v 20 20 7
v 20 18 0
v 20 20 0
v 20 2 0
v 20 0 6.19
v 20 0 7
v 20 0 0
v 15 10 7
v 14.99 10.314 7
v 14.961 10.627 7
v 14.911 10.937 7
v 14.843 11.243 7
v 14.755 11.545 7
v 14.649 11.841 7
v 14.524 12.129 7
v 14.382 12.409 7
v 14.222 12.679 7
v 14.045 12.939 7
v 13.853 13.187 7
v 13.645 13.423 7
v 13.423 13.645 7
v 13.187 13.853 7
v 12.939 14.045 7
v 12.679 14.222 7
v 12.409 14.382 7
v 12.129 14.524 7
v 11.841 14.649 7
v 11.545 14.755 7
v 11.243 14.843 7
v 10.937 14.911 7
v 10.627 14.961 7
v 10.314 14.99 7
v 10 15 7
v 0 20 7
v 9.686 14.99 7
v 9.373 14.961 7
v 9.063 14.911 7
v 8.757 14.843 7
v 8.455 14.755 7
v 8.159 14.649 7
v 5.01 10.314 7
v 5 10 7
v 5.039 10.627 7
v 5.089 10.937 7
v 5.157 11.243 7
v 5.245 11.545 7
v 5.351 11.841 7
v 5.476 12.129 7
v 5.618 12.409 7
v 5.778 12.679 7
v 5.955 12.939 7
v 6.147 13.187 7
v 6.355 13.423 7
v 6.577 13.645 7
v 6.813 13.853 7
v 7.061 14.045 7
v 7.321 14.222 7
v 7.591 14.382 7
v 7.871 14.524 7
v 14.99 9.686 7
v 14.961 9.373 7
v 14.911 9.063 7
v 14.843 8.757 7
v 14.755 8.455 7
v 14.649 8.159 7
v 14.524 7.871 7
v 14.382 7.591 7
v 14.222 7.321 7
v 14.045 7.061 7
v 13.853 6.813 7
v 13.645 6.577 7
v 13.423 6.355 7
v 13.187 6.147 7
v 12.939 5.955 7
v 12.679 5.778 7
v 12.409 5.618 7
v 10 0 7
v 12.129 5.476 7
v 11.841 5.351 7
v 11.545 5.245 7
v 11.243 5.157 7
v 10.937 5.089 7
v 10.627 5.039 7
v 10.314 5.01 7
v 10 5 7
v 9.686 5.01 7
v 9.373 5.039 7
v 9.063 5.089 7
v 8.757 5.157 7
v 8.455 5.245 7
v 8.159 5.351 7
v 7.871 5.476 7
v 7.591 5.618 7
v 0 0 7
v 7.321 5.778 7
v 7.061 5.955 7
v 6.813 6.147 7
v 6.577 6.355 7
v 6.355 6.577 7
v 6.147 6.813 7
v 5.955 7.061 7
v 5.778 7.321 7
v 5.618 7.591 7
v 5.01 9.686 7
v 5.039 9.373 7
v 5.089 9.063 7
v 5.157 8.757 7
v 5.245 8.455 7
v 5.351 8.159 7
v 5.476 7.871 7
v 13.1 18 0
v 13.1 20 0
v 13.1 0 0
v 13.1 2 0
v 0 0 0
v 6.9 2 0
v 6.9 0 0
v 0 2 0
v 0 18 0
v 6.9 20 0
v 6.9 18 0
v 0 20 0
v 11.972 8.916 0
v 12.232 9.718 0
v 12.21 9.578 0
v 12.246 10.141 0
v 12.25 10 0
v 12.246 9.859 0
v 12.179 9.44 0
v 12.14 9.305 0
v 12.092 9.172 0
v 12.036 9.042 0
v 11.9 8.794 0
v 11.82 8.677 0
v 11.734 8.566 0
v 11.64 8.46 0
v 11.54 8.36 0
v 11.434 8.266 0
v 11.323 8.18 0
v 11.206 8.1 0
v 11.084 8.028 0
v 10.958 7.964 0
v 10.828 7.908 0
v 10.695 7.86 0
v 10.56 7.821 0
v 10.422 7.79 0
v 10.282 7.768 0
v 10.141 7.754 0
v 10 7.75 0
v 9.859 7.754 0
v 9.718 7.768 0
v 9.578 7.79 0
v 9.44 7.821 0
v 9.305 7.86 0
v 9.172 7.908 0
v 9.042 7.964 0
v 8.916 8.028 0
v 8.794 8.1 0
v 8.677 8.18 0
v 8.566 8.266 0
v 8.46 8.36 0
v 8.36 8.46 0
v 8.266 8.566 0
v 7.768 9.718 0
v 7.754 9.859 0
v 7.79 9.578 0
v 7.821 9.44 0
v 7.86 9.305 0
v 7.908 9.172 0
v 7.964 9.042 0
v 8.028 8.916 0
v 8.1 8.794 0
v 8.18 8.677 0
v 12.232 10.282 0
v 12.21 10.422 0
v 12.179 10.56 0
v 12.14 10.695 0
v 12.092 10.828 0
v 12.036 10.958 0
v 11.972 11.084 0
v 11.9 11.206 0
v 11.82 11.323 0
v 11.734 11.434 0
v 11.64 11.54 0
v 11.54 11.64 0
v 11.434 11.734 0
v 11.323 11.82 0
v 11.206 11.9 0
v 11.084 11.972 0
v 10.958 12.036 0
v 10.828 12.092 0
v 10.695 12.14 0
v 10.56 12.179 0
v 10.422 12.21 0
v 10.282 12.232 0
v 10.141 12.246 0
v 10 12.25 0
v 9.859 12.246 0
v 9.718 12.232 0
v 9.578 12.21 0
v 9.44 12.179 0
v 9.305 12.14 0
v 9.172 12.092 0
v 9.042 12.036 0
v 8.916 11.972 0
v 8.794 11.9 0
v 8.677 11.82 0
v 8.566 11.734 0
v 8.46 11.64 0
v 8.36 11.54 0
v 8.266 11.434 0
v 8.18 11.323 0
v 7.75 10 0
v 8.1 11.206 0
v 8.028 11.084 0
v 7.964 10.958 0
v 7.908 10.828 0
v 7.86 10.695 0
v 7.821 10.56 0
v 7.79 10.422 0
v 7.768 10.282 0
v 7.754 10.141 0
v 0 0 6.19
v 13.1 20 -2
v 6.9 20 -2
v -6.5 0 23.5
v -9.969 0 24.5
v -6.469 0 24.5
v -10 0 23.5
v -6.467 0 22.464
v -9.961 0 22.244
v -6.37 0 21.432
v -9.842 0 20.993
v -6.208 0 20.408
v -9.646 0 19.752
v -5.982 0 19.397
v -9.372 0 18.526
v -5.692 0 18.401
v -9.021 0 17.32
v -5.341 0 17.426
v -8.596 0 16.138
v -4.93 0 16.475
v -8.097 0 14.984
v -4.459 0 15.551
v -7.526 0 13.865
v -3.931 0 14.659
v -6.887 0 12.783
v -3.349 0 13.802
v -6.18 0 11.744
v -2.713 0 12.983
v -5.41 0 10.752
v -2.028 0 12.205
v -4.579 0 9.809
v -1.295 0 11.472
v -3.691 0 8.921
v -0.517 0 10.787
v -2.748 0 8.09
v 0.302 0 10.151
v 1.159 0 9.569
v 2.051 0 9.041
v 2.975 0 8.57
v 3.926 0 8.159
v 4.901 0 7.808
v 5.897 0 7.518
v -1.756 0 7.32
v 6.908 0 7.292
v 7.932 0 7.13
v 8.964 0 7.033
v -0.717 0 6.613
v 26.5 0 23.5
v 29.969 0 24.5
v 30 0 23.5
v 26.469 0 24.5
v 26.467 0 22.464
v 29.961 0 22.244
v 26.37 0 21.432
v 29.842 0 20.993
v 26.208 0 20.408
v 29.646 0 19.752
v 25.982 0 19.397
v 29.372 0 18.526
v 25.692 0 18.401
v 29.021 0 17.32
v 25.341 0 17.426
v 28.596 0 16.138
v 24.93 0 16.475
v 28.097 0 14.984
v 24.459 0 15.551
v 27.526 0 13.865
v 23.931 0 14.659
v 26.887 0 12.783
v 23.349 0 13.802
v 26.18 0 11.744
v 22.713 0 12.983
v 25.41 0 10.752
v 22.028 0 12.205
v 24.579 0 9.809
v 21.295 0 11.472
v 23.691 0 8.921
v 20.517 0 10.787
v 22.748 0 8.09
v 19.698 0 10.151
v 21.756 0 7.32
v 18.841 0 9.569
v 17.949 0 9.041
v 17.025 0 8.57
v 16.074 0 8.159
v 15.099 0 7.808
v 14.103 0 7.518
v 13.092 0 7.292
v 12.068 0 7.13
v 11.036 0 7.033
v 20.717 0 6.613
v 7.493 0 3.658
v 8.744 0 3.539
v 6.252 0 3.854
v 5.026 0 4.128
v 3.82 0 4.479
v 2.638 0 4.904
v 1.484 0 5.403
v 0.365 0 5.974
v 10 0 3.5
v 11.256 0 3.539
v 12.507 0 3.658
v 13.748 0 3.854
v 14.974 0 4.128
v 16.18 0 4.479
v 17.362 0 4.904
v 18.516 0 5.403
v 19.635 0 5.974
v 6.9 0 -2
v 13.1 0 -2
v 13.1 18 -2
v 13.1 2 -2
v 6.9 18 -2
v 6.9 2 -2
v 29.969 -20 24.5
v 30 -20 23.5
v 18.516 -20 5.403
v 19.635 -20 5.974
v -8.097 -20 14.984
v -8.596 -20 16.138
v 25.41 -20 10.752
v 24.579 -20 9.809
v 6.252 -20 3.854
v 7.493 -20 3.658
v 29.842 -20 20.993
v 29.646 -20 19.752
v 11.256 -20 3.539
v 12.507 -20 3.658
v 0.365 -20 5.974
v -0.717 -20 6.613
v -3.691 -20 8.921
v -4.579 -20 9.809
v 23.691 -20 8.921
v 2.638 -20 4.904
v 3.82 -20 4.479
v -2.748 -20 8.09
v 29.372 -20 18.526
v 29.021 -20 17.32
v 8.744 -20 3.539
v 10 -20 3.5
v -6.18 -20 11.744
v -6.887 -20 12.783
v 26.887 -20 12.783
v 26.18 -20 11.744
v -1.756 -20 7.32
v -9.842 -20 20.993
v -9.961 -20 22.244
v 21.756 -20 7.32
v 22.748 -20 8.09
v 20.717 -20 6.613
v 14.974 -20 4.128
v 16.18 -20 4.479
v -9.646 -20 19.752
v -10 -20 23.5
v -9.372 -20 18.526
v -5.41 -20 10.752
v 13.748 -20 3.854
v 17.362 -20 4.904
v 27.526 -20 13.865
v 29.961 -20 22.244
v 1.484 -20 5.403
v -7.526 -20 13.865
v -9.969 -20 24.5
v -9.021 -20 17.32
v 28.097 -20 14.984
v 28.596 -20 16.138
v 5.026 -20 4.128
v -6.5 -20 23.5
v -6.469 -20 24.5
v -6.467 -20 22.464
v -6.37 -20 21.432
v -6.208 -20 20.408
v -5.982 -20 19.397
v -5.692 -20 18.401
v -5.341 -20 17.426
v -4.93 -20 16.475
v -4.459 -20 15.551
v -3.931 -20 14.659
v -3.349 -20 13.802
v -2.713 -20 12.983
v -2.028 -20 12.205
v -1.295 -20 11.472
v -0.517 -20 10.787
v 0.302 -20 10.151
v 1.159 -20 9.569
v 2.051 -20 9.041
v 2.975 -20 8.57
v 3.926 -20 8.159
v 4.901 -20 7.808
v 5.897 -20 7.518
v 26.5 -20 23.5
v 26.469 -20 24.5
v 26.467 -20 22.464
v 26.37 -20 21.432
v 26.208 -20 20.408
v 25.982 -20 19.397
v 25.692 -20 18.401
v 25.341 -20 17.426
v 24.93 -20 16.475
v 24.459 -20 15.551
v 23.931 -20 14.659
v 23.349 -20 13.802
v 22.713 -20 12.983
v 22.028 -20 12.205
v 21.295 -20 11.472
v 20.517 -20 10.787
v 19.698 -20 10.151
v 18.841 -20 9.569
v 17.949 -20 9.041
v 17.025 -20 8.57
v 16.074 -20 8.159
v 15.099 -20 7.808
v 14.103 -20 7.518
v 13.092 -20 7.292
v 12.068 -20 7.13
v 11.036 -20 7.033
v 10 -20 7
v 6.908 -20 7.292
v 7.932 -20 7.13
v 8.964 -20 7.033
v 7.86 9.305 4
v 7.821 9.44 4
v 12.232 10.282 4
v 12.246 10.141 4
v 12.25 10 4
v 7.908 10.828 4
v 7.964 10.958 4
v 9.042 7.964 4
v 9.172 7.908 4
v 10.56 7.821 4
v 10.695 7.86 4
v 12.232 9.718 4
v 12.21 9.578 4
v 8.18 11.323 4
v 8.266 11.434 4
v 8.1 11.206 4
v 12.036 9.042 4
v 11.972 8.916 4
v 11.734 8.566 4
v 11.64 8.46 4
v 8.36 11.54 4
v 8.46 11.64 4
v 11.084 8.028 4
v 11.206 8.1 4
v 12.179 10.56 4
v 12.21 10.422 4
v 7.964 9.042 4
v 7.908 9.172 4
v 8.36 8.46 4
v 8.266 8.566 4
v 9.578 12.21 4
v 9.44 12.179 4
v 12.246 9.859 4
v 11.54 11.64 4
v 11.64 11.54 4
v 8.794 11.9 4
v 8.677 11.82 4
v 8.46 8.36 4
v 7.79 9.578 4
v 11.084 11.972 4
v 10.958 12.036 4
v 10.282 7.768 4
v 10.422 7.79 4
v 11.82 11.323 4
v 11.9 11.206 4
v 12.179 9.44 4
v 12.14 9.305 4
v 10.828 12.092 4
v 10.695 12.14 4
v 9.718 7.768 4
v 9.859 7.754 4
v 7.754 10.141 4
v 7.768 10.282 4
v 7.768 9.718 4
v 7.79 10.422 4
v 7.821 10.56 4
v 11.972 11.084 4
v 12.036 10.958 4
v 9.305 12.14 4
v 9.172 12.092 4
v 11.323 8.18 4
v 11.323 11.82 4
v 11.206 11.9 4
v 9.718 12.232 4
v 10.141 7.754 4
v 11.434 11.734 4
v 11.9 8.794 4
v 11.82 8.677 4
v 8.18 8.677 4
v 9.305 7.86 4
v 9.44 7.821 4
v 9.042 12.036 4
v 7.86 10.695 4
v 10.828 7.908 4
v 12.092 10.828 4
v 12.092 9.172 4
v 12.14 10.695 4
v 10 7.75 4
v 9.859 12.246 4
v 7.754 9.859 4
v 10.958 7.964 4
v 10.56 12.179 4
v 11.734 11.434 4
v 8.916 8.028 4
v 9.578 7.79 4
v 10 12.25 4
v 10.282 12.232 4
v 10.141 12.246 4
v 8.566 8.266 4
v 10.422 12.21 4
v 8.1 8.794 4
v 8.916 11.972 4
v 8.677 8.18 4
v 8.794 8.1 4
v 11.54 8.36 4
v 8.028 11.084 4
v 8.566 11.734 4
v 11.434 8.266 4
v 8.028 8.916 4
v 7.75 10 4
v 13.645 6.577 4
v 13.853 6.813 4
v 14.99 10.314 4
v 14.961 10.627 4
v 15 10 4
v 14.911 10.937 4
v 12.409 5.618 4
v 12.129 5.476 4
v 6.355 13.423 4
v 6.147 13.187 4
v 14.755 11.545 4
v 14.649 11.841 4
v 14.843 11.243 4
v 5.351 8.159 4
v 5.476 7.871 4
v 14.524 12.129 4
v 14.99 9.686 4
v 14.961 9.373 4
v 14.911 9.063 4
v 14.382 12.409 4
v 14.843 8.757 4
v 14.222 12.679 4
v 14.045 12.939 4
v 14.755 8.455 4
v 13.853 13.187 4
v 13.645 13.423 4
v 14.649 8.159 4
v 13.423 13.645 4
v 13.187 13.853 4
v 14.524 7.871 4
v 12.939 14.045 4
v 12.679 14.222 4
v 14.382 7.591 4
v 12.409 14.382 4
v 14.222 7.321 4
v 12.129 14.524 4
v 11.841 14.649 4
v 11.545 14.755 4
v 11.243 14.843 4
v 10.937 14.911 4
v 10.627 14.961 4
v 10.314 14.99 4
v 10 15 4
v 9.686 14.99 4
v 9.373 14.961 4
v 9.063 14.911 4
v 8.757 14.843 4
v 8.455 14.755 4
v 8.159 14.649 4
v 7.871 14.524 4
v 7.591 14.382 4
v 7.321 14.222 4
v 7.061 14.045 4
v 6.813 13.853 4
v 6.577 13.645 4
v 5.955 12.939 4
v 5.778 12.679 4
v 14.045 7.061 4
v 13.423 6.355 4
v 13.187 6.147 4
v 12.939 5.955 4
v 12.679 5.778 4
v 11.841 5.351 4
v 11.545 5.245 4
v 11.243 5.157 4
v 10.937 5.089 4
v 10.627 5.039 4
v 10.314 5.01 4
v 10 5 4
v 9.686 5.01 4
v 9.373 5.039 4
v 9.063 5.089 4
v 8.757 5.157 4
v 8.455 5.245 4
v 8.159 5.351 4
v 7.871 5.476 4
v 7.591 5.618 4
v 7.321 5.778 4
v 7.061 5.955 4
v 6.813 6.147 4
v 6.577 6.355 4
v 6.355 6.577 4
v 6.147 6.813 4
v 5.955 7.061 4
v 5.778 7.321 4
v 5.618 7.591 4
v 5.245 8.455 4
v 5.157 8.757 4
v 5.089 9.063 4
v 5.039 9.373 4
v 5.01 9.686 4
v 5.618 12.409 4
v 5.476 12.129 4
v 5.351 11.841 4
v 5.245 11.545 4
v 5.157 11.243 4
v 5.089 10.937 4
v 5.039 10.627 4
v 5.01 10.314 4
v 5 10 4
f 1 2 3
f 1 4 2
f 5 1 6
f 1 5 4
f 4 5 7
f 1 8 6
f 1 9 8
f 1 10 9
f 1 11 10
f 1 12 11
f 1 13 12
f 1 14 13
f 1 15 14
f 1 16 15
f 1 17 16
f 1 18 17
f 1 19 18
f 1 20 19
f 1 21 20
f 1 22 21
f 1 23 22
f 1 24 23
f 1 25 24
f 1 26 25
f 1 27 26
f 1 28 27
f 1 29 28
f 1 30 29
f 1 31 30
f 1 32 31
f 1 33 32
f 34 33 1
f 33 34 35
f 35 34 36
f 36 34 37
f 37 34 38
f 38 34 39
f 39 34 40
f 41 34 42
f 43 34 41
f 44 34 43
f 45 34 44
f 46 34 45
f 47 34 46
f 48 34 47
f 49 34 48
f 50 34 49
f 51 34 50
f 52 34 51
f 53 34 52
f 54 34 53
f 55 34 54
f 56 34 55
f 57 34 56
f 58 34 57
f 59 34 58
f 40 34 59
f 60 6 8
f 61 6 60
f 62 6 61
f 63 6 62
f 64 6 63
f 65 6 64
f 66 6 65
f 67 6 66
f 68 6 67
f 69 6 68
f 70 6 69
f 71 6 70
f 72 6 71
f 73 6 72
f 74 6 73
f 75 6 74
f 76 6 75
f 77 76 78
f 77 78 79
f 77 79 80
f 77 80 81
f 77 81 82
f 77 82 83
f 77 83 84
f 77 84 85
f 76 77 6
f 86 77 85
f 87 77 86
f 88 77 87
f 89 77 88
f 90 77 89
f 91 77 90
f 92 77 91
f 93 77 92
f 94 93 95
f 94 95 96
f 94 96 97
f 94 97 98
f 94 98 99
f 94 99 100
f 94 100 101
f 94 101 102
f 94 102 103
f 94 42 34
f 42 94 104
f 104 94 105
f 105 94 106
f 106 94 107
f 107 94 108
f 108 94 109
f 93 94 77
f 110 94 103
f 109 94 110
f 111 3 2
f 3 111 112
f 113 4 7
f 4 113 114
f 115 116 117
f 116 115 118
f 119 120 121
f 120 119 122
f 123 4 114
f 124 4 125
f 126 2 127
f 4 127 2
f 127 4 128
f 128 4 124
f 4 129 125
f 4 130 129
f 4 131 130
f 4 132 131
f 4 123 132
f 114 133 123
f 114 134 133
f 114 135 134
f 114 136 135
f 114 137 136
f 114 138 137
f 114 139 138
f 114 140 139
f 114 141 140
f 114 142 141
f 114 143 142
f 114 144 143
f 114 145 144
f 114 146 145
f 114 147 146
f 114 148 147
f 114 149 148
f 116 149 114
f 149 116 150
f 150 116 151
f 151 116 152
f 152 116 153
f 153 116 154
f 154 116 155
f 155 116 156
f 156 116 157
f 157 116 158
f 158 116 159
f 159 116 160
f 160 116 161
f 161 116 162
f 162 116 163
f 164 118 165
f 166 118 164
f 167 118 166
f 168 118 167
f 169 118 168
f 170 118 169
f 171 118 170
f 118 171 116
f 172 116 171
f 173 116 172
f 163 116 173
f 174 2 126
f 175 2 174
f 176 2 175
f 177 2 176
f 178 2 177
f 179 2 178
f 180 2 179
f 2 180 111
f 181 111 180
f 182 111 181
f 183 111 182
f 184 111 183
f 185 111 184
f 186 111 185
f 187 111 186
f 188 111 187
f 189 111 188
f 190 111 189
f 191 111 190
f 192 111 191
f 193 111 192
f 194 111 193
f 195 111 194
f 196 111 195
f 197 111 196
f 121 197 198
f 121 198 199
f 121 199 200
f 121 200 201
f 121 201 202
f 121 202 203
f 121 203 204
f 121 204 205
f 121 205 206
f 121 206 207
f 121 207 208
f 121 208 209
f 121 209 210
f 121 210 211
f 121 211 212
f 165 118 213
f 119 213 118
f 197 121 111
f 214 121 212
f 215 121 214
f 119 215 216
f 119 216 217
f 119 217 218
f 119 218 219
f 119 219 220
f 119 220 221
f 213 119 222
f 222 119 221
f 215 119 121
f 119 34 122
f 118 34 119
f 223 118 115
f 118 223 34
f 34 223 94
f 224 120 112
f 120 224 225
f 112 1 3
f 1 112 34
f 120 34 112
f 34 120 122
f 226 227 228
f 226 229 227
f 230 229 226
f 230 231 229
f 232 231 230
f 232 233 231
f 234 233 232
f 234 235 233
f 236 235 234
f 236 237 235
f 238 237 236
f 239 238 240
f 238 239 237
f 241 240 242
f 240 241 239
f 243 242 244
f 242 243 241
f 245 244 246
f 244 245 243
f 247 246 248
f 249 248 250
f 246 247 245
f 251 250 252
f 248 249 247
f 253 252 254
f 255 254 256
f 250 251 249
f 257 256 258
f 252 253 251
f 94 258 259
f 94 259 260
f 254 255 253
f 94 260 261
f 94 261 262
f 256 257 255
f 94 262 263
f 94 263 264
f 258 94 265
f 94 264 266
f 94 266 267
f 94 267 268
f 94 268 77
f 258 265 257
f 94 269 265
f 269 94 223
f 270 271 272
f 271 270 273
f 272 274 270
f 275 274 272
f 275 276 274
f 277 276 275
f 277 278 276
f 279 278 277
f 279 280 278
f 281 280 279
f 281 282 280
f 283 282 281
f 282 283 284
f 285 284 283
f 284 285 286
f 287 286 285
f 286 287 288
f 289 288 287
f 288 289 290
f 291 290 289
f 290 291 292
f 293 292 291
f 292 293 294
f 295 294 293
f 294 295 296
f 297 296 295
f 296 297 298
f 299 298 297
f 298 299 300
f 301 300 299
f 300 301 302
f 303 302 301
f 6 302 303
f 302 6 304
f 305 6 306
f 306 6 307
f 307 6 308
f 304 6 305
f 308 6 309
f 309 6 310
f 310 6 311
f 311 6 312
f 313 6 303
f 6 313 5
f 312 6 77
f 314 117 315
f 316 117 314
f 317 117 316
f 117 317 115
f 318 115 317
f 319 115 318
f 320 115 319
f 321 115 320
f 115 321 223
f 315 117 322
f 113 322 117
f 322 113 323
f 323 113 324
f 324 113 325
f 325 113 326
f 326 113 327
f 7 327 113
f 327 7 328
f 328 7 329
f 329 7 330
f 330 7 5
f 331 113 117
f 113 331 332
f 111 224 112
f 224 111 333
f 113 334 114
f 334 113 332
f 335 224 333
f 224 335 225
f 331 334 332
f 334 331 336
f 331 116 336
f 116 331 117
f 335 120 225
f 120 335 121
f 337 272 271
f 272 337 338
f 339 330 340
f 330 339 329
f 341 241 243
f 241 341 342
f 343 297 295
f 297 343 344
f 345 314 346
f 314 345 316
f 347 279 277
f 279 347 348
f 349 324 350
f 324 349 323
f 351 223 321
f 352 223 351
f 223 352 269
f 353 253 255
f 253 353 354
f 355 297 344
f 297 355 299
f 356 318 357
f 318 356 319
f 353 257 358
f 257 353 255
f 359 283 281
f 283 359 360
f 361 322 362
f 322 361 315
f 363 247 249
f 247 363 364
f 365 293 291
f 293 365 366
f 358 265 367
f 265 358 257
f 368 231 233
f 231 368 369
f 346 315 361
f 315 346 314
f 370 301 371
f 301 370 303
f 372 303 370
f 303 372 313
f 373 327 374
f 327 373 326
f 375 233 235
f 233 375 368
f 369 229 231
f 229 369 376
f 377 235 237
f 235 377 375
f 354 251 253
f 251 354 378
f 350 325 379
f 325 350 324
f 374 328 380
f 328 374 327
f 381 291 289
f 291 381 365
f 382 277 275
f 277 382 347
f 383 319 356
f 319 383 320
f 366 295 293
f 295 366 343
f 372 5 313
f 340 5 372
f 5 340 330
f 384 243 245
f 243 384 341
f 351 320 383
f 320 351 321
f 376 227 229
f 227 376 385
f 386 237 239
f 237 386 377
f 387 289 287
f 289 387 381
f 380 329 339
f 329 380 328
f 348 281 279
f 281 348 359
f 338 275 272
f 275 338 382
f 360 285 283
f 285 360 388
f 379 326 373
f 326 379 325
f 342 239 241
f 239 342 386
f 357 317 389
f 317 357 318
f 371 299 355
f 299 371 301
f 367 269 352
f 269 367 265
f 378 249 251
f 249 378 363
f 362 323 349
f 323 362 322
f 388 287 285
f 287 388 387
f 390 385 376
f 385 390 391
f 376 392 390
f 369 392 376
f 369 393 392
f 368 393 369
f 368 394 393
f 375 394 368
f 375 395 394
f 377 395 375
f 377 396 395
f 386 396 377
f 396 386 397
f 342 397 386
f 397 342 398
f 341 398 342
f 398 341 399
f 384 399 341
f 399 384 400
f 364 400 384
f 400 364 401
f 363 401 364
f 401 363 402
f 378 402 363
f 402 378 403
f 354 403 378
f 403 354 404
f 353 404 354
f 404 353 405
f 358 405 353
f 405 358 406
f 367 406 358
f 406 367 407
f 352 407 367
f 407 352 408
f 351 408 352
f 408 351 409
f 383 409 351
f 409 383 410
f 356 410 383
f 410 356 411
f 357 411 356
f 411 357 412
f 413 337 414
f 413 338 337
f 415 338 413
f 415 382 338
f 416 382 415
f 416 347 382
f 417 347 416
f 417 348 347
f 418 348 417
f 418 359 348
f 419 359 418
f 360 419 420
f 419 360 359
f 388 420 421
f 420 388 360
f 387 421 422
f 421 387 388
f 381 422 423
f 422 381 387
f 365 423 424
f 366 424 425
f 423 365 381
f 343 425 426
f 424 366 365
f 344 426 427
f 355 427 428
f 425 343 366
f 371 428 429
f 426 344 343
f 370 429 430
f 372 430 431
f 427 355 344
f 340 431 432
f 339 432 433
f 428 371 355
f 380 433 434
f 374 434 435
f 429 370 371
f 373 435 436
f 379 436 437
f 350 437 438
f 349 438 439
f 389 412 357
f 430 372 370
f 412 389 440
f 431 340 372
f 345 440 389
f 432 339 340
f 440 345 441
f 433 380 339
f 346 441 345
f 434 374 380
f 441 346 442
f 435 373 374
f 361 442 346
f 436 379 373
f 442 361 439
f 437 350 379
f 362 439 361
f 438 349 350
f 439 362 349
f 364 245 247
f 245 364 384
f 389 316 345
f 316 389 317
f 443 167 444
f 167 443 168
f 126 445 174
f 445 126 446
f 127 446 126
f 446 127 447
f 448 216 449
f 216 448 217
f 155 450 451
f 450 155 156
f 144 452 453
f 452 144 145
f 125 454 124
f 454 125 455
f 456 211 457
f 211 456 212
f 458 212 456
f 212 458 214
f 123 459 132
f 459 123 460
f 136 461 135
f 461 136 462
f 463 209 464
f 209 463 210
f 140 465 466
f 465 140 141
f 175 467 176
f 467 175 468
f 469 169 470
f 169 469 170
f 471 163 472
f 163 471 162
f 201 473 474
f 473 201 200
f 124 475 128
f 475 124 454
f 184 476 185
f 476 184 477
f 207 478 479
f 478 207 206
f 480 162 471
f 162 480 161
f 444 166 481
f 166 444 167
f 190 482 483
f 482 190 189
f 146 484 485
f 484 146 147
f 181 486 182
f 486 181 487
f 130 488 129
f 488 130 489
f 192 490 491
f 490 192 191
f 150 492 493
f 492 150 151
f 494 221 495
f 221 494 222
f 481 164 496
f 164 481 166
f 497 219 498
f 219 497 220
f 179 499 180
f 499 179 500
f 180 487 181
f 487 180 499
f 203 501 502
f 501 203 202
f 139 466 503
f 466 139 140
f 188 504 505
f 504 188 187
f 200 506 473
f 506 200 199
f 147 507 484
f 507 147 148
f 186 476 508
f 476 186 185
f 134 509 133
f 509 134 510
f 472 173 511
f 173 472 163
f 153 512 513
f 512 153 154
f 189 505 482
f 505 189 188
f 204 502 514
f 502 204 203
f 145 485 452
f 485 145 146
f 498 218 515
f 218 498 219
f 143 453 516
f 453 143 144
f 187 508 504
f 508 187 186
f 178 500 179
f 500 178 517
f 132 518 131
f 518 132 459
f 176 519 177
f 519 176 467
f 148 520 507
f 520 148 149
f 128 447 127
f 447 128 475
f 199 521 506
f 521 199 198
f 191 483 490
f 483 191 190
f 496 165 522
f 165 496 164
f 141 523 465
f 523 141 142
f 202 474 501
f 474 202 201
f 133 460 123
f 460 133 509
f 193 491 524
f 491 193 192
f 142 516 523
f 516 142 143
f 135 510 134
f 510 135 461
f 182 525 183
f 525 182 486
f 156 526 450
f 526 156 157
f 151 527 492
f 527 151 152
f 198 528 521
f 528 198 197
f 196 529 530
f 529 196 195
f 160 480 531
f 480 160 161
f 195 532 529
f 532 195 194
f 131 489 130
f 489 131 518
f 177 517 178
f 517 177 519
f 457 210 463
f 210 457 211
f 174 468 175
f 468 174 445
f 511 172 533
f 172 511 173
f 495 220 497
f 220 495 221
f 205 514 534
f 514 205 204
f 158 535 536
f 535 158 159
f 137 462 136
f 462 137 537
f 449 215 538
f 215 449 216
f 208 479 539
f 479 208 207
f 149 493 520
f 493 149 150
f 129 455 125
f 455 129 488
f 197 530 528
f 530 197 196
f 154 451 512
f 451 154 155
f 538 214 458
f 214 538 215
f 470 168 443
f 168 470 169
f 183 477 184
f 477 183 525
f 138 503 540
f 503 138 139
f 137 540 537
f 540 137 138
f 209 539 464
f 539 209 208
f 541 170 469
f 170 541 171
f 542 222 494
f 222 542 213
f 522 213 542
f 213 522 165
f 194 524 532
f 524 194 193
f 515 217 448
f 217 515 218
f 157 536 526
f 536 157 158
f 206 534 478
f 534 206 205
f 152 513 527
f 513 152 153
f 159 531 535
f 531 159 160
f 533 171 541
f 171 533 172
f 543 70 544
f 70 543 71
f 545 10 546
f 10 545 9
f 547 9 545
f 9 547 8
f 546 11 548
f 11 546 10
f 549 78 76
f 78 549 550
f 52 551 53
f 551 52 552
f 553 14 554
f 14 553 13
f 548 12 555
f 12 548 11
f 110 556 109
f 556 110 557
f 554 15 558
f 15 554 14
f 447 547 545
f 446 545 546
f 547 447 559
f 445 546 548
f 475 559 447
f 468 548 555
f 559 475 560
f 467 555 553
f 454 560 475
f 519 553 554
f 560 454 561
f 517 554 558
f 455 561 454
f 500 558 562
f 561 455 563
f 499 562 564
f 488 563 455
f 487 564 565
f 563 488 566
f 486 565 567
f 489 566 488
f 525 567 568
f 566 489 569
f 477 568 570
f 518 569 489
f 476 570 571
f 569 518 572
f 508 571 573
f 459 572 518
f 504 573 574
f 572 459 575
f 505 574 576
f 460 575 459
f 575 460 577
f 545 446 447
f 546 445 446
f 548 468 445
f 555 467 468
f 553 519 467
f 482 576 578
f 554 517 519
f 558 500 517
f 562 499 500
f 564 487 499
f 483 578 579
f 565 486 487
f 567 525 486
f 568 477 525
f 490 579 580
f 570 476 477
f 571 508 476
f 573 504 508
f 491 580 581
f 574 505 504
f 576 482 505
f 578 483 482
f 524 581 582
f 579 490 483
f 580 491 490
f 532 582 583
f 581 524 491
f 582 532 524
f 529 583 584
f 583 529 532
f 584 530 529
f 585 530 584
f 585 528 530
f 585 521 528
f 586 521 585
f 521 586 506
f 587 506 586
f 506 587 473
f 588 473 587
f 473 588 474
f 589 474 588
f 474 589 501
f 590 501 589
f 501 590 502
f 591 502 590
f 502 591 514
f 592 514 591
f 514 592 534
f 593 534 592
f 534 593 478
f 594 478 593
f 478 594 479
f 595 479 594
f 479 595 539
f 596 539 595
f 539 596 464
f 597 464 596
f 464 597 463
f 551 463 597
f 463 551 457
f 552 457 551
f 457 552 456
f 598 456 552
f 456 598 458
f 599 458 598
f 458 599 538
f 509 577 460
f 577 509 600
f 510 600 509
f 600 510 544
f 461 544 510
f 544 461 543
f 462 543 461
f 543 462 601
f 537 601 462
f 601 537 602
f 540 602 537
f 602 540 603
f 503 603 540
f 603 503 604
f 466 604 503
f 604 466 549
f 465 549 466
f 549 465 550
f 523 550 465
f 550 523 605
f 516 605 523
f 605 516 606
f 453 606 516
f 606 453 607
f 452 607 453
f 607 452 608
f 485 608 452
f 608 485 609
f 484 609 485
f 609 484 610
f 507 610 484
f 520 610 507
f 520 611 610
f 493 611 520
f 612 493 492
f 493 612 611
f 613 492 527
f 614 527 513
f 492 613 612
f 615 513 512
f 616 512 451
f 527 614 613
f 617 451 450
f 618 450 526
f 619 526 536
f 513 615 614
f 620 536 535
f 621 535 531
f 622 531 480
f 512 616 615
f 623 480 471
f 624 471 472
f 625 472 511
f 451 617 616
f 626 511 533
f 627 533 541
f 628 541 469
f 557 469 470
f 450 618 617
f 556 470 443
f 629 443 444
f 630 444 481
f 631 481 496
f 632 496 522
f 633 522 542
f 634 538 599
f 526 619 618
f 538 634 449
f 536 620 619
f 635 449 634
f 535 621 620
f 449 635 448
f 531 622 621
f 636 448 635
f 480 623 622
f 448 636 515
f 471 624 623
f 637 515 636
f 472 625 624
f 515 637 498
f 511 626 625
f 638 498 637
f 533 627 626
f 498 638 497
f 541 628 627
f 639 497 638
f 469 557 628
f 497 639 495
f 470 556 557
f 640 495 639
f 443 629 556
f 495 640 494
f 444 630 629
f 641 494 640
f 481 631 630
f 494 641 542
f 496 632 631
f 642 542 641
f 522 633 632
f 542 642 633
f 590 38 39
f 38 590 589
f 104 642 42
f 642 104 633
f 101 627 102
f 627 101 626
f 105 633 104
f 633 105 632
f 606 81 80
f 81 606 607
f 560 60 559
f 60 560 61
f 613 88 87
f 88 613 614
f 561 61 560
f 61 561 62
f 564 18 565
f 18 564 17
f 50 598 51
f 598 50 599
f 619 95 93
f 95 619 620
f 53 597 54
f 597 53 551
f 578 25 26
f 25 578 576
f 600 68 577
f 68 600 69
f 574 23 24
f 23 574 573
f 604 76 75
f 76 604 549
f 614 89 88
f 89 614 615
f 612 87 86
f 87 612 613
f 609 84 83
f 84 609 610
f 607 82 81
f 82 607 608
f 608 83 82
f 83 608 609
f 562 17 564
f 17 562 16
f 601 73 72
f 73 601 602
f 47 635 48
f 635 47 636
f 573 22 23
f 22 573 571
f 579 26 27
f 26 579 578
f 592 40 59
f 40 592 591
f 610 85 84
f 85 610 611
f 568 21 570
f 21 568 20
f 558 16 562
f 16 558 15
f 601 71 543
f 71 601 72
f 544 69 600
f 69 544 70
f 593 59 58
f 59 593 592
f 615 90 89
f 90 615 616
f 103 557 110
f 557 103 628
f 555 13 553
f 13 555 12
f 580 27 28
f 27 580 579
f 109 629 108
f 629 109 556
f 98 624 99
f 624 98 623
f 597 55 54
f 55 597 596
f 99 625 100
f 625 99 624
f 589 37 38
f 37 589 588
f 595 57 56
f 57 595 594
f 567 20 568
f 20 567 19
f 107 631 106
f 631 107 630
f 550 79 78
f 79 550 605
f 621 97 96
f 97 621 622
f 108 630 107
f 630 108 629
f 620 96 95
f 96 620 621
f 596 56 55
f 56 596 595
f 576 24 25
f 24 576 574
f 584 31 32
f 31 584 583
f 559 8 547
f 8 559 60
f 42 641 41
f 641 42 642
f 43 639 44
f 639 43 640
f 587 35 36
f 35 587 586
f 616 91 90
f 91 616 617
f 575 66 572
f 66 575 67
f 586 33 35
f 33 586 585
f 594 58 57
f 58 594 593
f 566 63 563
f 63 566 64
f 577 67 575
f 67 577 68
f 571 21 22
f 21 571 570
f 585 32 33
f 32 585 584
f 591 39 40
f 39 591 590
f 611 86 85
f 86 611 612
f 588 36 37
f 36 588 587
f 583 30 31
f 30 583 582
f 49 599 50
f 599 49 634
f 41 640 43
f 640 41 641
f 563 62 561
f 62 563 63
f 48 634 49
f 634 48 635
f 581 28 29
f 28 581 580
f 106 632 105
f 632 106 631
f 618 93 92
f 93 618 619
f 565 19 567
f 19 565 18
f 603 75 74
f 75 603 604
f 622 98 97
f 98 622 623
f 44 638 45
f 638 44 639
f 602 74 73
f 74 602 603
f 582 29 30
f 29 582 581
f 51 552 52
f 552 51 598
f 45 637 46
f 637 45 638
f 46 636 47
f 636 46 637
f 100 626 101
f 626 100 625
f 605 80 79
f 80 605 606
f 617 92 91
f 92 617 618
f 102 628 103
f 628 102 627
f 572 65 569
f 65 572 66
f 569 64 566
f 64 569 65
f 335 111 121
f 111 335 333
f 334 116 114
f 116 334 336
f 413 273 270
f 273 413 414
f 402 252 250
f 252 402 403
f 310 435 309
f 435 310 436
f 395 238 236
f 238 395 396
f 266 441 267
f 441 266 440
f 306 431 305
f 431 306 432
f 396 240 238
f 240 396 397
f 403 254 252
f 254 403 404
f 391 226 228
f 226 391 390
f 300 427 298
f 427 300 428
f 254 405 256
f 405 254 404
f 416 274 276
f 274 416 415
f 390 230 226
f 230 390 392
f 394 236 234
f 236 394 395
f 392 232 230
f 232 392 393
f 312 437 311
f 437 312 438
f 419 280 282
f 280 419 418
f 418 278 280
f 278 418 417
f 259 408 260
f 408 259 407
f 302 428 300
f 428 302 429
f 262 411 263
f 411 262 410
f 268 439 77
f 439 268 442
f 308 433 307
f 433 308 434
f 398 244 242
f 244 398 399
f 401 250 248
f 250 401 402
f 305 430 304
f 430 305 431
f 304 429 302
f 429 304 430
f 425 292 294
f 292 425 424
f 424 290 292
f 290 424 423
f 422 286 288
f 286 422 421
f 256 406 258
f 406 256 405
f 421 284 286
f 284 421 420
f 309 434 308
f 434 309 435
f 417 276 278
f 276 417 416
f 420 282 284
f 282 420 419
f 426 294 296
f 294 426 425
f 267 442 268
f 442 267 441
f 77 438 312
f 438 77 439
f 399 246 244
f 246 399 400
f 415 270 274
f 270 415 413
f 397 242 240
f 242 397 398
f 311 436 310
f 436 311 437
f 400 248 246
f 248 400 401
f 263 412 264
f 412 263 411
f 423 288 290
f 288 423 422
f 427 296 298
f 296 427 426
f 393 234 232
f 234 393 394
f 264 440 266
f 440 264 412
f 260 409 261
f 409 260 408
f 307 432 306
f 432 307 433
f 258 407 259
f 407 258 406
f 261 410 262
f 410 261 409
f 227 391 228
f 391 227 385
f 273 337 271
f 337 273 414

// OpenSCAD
/*
     Halterung für Pumpe
     
*/

$fn = $preview ? 20 : 100;


laenge = 20.0;  // Slot-Breite
breite = 20.0;
dicke = 7.0;
stegbreite = 6.2;
steghoehe = 2.0;
stegluecke = 16.0;

seitenwandhoehe = 10.0;
seitendicke = 4.0;

// Steg
lochdurchmesser = 4.5;

// Schraube
schraubenkopfdurchmesser = 10.0;
schraubenkopfhoehe = 3.0;

// Straps
strapsdurchmesser = 3.0;

halterhoehe = 20.0;
halterinnendm = 33.0;
halteraussendm = halterinnendm+dicke;

difference() {
    union() {
        // Basisplatte
        cube([laenge,breite,dicke]);

        // der Steg fürs Aluprofil
        translate([10.0-stegbreite/2,0,-steghoehe]) 
        cube([stegbreite,breite,steghoehe+1.0]);
        
        translate([10,0,halterinnendm/2.0+dicke])
        rotate([90,0,0])
        cylinder(h=halterhoehe,d=halteraussendm);

    }
    
    union() {
        // die Schraubenlöcher+Schraubenkopf
        translate([10.0,breite/2.0,-10.0]) 
        cylinder(h=20.0, d=lochdurchmesser);

        translate([10.0,breite/2.0,dicke-schraubenkopfhoehe]) 
        cylinder(h=schraubenkopfhoehe+1.0, d=schraubenkopfdurchmesser);

        // Lücke im Steg
        translate([0,(breite-stegluecke)/2.0,-steghoehe]) 
        cube([laenge,stegluecke,steghoehe]);

        translate([10,1,halterinnendm/2.0+dicke])
        rotate([90,0,0])
        cylinder(h=halterhoehe+2,d=halterinnendm);
        
        translate([ -halterinnendm/2.0+dicke-1,
                        -halterhoehe-1,
                        halterinnendm/2+dicke+1])
        cube([halteraussendm+2,halterhoehe+2,40]);
    }    
}
